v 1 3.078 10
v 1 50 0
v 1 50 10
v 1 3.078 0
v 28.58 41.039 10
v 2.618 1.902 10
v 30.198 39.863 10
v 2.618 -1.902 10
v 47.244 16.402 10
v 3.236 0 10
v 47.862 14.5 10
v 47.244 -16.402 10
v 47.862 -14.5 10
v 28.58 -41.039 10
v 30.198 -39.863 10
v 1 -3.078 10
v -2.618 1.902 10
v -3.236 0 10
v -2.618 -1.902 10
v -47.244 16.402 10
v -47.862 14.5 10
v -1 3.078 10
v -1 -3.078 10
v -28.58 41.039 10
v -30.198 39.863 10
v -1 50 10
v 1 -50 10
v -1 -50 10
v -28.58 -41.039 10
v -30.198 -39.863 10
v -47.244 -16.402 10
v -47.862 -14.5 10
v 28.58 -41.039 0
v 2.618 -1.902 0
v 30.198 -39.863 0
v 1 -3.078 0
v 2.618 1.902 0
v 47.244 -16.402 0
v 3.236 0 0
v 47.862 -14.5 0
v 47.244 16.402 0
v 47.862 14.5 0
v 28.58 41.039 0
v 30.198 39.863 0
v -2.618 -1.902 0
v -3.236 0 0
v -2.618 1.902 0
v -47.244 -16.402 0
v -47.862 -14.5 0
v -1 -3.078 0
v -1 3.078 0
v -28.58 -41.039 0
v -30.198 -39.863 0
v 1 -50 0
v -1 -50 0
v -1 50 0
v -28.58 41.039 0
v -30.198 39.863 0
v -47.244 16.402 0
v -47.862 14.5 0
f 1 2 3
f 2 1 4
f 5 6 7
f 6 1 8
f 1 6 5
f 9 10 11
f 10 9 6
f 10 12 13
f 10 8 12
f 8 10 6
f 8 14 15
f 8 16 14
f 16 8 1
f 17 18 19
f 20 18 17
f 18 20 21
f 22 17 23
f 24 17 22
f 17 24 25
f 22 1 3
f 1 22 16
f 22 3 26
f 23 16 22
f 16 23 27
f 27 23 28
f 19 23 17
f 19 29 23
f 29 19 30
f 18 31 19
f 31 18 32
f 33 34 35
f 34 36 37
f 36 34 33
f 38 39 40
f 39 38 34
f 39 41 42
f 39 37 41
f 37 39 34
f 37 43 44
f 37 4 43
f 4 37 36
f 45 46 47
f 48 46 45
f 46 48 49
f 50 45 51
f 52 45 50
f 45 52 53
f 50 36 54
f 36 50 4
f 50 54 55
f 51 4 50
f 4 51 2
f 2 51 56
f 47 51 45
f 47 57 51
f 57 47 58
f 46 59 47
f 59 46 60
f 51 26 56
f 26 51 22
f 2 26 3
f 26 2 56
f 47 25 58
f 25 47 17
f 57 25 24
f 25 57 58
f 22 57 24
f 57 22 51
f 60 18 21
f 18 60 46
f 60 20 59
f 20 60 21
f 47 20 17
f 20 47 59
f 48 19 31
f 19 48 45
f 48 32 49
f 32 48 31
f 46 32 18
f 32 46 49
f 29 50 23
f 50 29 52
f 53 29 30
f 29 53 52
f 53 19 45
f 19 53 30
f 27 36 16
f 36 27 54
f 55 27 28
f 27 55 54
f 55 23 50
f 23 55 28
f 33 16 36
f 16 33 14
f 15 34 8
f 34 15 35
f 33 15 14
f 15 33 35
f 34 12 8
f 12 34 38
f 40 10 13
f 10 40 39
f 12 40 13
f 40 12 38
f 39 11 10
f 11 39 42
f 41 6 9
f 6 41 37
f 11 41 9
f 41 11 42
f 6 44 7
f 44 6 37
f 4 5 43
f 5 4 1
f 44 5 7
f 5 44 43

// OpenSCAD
// [FL_INDEX: keywords="openscad, 3d_parametric, Parametric_Cake_Guide, csg_solid" | COT="Parametric OpenSCAD design from 3DCodeverse"]
// Title: Parametric Cake Guide

radius = 50;
wall_t = 2;
wall_h = 10;
slices = 10;

slice_angle = 360 / slices;

for (slice = [1 : slices]) {
  rotate([0, 0, slice_angle * (slice - 1)])
    translate([-wall_t / 2, 0, 0])
    cube(size = [wall_t, radius, wall_h], center=false);
}
